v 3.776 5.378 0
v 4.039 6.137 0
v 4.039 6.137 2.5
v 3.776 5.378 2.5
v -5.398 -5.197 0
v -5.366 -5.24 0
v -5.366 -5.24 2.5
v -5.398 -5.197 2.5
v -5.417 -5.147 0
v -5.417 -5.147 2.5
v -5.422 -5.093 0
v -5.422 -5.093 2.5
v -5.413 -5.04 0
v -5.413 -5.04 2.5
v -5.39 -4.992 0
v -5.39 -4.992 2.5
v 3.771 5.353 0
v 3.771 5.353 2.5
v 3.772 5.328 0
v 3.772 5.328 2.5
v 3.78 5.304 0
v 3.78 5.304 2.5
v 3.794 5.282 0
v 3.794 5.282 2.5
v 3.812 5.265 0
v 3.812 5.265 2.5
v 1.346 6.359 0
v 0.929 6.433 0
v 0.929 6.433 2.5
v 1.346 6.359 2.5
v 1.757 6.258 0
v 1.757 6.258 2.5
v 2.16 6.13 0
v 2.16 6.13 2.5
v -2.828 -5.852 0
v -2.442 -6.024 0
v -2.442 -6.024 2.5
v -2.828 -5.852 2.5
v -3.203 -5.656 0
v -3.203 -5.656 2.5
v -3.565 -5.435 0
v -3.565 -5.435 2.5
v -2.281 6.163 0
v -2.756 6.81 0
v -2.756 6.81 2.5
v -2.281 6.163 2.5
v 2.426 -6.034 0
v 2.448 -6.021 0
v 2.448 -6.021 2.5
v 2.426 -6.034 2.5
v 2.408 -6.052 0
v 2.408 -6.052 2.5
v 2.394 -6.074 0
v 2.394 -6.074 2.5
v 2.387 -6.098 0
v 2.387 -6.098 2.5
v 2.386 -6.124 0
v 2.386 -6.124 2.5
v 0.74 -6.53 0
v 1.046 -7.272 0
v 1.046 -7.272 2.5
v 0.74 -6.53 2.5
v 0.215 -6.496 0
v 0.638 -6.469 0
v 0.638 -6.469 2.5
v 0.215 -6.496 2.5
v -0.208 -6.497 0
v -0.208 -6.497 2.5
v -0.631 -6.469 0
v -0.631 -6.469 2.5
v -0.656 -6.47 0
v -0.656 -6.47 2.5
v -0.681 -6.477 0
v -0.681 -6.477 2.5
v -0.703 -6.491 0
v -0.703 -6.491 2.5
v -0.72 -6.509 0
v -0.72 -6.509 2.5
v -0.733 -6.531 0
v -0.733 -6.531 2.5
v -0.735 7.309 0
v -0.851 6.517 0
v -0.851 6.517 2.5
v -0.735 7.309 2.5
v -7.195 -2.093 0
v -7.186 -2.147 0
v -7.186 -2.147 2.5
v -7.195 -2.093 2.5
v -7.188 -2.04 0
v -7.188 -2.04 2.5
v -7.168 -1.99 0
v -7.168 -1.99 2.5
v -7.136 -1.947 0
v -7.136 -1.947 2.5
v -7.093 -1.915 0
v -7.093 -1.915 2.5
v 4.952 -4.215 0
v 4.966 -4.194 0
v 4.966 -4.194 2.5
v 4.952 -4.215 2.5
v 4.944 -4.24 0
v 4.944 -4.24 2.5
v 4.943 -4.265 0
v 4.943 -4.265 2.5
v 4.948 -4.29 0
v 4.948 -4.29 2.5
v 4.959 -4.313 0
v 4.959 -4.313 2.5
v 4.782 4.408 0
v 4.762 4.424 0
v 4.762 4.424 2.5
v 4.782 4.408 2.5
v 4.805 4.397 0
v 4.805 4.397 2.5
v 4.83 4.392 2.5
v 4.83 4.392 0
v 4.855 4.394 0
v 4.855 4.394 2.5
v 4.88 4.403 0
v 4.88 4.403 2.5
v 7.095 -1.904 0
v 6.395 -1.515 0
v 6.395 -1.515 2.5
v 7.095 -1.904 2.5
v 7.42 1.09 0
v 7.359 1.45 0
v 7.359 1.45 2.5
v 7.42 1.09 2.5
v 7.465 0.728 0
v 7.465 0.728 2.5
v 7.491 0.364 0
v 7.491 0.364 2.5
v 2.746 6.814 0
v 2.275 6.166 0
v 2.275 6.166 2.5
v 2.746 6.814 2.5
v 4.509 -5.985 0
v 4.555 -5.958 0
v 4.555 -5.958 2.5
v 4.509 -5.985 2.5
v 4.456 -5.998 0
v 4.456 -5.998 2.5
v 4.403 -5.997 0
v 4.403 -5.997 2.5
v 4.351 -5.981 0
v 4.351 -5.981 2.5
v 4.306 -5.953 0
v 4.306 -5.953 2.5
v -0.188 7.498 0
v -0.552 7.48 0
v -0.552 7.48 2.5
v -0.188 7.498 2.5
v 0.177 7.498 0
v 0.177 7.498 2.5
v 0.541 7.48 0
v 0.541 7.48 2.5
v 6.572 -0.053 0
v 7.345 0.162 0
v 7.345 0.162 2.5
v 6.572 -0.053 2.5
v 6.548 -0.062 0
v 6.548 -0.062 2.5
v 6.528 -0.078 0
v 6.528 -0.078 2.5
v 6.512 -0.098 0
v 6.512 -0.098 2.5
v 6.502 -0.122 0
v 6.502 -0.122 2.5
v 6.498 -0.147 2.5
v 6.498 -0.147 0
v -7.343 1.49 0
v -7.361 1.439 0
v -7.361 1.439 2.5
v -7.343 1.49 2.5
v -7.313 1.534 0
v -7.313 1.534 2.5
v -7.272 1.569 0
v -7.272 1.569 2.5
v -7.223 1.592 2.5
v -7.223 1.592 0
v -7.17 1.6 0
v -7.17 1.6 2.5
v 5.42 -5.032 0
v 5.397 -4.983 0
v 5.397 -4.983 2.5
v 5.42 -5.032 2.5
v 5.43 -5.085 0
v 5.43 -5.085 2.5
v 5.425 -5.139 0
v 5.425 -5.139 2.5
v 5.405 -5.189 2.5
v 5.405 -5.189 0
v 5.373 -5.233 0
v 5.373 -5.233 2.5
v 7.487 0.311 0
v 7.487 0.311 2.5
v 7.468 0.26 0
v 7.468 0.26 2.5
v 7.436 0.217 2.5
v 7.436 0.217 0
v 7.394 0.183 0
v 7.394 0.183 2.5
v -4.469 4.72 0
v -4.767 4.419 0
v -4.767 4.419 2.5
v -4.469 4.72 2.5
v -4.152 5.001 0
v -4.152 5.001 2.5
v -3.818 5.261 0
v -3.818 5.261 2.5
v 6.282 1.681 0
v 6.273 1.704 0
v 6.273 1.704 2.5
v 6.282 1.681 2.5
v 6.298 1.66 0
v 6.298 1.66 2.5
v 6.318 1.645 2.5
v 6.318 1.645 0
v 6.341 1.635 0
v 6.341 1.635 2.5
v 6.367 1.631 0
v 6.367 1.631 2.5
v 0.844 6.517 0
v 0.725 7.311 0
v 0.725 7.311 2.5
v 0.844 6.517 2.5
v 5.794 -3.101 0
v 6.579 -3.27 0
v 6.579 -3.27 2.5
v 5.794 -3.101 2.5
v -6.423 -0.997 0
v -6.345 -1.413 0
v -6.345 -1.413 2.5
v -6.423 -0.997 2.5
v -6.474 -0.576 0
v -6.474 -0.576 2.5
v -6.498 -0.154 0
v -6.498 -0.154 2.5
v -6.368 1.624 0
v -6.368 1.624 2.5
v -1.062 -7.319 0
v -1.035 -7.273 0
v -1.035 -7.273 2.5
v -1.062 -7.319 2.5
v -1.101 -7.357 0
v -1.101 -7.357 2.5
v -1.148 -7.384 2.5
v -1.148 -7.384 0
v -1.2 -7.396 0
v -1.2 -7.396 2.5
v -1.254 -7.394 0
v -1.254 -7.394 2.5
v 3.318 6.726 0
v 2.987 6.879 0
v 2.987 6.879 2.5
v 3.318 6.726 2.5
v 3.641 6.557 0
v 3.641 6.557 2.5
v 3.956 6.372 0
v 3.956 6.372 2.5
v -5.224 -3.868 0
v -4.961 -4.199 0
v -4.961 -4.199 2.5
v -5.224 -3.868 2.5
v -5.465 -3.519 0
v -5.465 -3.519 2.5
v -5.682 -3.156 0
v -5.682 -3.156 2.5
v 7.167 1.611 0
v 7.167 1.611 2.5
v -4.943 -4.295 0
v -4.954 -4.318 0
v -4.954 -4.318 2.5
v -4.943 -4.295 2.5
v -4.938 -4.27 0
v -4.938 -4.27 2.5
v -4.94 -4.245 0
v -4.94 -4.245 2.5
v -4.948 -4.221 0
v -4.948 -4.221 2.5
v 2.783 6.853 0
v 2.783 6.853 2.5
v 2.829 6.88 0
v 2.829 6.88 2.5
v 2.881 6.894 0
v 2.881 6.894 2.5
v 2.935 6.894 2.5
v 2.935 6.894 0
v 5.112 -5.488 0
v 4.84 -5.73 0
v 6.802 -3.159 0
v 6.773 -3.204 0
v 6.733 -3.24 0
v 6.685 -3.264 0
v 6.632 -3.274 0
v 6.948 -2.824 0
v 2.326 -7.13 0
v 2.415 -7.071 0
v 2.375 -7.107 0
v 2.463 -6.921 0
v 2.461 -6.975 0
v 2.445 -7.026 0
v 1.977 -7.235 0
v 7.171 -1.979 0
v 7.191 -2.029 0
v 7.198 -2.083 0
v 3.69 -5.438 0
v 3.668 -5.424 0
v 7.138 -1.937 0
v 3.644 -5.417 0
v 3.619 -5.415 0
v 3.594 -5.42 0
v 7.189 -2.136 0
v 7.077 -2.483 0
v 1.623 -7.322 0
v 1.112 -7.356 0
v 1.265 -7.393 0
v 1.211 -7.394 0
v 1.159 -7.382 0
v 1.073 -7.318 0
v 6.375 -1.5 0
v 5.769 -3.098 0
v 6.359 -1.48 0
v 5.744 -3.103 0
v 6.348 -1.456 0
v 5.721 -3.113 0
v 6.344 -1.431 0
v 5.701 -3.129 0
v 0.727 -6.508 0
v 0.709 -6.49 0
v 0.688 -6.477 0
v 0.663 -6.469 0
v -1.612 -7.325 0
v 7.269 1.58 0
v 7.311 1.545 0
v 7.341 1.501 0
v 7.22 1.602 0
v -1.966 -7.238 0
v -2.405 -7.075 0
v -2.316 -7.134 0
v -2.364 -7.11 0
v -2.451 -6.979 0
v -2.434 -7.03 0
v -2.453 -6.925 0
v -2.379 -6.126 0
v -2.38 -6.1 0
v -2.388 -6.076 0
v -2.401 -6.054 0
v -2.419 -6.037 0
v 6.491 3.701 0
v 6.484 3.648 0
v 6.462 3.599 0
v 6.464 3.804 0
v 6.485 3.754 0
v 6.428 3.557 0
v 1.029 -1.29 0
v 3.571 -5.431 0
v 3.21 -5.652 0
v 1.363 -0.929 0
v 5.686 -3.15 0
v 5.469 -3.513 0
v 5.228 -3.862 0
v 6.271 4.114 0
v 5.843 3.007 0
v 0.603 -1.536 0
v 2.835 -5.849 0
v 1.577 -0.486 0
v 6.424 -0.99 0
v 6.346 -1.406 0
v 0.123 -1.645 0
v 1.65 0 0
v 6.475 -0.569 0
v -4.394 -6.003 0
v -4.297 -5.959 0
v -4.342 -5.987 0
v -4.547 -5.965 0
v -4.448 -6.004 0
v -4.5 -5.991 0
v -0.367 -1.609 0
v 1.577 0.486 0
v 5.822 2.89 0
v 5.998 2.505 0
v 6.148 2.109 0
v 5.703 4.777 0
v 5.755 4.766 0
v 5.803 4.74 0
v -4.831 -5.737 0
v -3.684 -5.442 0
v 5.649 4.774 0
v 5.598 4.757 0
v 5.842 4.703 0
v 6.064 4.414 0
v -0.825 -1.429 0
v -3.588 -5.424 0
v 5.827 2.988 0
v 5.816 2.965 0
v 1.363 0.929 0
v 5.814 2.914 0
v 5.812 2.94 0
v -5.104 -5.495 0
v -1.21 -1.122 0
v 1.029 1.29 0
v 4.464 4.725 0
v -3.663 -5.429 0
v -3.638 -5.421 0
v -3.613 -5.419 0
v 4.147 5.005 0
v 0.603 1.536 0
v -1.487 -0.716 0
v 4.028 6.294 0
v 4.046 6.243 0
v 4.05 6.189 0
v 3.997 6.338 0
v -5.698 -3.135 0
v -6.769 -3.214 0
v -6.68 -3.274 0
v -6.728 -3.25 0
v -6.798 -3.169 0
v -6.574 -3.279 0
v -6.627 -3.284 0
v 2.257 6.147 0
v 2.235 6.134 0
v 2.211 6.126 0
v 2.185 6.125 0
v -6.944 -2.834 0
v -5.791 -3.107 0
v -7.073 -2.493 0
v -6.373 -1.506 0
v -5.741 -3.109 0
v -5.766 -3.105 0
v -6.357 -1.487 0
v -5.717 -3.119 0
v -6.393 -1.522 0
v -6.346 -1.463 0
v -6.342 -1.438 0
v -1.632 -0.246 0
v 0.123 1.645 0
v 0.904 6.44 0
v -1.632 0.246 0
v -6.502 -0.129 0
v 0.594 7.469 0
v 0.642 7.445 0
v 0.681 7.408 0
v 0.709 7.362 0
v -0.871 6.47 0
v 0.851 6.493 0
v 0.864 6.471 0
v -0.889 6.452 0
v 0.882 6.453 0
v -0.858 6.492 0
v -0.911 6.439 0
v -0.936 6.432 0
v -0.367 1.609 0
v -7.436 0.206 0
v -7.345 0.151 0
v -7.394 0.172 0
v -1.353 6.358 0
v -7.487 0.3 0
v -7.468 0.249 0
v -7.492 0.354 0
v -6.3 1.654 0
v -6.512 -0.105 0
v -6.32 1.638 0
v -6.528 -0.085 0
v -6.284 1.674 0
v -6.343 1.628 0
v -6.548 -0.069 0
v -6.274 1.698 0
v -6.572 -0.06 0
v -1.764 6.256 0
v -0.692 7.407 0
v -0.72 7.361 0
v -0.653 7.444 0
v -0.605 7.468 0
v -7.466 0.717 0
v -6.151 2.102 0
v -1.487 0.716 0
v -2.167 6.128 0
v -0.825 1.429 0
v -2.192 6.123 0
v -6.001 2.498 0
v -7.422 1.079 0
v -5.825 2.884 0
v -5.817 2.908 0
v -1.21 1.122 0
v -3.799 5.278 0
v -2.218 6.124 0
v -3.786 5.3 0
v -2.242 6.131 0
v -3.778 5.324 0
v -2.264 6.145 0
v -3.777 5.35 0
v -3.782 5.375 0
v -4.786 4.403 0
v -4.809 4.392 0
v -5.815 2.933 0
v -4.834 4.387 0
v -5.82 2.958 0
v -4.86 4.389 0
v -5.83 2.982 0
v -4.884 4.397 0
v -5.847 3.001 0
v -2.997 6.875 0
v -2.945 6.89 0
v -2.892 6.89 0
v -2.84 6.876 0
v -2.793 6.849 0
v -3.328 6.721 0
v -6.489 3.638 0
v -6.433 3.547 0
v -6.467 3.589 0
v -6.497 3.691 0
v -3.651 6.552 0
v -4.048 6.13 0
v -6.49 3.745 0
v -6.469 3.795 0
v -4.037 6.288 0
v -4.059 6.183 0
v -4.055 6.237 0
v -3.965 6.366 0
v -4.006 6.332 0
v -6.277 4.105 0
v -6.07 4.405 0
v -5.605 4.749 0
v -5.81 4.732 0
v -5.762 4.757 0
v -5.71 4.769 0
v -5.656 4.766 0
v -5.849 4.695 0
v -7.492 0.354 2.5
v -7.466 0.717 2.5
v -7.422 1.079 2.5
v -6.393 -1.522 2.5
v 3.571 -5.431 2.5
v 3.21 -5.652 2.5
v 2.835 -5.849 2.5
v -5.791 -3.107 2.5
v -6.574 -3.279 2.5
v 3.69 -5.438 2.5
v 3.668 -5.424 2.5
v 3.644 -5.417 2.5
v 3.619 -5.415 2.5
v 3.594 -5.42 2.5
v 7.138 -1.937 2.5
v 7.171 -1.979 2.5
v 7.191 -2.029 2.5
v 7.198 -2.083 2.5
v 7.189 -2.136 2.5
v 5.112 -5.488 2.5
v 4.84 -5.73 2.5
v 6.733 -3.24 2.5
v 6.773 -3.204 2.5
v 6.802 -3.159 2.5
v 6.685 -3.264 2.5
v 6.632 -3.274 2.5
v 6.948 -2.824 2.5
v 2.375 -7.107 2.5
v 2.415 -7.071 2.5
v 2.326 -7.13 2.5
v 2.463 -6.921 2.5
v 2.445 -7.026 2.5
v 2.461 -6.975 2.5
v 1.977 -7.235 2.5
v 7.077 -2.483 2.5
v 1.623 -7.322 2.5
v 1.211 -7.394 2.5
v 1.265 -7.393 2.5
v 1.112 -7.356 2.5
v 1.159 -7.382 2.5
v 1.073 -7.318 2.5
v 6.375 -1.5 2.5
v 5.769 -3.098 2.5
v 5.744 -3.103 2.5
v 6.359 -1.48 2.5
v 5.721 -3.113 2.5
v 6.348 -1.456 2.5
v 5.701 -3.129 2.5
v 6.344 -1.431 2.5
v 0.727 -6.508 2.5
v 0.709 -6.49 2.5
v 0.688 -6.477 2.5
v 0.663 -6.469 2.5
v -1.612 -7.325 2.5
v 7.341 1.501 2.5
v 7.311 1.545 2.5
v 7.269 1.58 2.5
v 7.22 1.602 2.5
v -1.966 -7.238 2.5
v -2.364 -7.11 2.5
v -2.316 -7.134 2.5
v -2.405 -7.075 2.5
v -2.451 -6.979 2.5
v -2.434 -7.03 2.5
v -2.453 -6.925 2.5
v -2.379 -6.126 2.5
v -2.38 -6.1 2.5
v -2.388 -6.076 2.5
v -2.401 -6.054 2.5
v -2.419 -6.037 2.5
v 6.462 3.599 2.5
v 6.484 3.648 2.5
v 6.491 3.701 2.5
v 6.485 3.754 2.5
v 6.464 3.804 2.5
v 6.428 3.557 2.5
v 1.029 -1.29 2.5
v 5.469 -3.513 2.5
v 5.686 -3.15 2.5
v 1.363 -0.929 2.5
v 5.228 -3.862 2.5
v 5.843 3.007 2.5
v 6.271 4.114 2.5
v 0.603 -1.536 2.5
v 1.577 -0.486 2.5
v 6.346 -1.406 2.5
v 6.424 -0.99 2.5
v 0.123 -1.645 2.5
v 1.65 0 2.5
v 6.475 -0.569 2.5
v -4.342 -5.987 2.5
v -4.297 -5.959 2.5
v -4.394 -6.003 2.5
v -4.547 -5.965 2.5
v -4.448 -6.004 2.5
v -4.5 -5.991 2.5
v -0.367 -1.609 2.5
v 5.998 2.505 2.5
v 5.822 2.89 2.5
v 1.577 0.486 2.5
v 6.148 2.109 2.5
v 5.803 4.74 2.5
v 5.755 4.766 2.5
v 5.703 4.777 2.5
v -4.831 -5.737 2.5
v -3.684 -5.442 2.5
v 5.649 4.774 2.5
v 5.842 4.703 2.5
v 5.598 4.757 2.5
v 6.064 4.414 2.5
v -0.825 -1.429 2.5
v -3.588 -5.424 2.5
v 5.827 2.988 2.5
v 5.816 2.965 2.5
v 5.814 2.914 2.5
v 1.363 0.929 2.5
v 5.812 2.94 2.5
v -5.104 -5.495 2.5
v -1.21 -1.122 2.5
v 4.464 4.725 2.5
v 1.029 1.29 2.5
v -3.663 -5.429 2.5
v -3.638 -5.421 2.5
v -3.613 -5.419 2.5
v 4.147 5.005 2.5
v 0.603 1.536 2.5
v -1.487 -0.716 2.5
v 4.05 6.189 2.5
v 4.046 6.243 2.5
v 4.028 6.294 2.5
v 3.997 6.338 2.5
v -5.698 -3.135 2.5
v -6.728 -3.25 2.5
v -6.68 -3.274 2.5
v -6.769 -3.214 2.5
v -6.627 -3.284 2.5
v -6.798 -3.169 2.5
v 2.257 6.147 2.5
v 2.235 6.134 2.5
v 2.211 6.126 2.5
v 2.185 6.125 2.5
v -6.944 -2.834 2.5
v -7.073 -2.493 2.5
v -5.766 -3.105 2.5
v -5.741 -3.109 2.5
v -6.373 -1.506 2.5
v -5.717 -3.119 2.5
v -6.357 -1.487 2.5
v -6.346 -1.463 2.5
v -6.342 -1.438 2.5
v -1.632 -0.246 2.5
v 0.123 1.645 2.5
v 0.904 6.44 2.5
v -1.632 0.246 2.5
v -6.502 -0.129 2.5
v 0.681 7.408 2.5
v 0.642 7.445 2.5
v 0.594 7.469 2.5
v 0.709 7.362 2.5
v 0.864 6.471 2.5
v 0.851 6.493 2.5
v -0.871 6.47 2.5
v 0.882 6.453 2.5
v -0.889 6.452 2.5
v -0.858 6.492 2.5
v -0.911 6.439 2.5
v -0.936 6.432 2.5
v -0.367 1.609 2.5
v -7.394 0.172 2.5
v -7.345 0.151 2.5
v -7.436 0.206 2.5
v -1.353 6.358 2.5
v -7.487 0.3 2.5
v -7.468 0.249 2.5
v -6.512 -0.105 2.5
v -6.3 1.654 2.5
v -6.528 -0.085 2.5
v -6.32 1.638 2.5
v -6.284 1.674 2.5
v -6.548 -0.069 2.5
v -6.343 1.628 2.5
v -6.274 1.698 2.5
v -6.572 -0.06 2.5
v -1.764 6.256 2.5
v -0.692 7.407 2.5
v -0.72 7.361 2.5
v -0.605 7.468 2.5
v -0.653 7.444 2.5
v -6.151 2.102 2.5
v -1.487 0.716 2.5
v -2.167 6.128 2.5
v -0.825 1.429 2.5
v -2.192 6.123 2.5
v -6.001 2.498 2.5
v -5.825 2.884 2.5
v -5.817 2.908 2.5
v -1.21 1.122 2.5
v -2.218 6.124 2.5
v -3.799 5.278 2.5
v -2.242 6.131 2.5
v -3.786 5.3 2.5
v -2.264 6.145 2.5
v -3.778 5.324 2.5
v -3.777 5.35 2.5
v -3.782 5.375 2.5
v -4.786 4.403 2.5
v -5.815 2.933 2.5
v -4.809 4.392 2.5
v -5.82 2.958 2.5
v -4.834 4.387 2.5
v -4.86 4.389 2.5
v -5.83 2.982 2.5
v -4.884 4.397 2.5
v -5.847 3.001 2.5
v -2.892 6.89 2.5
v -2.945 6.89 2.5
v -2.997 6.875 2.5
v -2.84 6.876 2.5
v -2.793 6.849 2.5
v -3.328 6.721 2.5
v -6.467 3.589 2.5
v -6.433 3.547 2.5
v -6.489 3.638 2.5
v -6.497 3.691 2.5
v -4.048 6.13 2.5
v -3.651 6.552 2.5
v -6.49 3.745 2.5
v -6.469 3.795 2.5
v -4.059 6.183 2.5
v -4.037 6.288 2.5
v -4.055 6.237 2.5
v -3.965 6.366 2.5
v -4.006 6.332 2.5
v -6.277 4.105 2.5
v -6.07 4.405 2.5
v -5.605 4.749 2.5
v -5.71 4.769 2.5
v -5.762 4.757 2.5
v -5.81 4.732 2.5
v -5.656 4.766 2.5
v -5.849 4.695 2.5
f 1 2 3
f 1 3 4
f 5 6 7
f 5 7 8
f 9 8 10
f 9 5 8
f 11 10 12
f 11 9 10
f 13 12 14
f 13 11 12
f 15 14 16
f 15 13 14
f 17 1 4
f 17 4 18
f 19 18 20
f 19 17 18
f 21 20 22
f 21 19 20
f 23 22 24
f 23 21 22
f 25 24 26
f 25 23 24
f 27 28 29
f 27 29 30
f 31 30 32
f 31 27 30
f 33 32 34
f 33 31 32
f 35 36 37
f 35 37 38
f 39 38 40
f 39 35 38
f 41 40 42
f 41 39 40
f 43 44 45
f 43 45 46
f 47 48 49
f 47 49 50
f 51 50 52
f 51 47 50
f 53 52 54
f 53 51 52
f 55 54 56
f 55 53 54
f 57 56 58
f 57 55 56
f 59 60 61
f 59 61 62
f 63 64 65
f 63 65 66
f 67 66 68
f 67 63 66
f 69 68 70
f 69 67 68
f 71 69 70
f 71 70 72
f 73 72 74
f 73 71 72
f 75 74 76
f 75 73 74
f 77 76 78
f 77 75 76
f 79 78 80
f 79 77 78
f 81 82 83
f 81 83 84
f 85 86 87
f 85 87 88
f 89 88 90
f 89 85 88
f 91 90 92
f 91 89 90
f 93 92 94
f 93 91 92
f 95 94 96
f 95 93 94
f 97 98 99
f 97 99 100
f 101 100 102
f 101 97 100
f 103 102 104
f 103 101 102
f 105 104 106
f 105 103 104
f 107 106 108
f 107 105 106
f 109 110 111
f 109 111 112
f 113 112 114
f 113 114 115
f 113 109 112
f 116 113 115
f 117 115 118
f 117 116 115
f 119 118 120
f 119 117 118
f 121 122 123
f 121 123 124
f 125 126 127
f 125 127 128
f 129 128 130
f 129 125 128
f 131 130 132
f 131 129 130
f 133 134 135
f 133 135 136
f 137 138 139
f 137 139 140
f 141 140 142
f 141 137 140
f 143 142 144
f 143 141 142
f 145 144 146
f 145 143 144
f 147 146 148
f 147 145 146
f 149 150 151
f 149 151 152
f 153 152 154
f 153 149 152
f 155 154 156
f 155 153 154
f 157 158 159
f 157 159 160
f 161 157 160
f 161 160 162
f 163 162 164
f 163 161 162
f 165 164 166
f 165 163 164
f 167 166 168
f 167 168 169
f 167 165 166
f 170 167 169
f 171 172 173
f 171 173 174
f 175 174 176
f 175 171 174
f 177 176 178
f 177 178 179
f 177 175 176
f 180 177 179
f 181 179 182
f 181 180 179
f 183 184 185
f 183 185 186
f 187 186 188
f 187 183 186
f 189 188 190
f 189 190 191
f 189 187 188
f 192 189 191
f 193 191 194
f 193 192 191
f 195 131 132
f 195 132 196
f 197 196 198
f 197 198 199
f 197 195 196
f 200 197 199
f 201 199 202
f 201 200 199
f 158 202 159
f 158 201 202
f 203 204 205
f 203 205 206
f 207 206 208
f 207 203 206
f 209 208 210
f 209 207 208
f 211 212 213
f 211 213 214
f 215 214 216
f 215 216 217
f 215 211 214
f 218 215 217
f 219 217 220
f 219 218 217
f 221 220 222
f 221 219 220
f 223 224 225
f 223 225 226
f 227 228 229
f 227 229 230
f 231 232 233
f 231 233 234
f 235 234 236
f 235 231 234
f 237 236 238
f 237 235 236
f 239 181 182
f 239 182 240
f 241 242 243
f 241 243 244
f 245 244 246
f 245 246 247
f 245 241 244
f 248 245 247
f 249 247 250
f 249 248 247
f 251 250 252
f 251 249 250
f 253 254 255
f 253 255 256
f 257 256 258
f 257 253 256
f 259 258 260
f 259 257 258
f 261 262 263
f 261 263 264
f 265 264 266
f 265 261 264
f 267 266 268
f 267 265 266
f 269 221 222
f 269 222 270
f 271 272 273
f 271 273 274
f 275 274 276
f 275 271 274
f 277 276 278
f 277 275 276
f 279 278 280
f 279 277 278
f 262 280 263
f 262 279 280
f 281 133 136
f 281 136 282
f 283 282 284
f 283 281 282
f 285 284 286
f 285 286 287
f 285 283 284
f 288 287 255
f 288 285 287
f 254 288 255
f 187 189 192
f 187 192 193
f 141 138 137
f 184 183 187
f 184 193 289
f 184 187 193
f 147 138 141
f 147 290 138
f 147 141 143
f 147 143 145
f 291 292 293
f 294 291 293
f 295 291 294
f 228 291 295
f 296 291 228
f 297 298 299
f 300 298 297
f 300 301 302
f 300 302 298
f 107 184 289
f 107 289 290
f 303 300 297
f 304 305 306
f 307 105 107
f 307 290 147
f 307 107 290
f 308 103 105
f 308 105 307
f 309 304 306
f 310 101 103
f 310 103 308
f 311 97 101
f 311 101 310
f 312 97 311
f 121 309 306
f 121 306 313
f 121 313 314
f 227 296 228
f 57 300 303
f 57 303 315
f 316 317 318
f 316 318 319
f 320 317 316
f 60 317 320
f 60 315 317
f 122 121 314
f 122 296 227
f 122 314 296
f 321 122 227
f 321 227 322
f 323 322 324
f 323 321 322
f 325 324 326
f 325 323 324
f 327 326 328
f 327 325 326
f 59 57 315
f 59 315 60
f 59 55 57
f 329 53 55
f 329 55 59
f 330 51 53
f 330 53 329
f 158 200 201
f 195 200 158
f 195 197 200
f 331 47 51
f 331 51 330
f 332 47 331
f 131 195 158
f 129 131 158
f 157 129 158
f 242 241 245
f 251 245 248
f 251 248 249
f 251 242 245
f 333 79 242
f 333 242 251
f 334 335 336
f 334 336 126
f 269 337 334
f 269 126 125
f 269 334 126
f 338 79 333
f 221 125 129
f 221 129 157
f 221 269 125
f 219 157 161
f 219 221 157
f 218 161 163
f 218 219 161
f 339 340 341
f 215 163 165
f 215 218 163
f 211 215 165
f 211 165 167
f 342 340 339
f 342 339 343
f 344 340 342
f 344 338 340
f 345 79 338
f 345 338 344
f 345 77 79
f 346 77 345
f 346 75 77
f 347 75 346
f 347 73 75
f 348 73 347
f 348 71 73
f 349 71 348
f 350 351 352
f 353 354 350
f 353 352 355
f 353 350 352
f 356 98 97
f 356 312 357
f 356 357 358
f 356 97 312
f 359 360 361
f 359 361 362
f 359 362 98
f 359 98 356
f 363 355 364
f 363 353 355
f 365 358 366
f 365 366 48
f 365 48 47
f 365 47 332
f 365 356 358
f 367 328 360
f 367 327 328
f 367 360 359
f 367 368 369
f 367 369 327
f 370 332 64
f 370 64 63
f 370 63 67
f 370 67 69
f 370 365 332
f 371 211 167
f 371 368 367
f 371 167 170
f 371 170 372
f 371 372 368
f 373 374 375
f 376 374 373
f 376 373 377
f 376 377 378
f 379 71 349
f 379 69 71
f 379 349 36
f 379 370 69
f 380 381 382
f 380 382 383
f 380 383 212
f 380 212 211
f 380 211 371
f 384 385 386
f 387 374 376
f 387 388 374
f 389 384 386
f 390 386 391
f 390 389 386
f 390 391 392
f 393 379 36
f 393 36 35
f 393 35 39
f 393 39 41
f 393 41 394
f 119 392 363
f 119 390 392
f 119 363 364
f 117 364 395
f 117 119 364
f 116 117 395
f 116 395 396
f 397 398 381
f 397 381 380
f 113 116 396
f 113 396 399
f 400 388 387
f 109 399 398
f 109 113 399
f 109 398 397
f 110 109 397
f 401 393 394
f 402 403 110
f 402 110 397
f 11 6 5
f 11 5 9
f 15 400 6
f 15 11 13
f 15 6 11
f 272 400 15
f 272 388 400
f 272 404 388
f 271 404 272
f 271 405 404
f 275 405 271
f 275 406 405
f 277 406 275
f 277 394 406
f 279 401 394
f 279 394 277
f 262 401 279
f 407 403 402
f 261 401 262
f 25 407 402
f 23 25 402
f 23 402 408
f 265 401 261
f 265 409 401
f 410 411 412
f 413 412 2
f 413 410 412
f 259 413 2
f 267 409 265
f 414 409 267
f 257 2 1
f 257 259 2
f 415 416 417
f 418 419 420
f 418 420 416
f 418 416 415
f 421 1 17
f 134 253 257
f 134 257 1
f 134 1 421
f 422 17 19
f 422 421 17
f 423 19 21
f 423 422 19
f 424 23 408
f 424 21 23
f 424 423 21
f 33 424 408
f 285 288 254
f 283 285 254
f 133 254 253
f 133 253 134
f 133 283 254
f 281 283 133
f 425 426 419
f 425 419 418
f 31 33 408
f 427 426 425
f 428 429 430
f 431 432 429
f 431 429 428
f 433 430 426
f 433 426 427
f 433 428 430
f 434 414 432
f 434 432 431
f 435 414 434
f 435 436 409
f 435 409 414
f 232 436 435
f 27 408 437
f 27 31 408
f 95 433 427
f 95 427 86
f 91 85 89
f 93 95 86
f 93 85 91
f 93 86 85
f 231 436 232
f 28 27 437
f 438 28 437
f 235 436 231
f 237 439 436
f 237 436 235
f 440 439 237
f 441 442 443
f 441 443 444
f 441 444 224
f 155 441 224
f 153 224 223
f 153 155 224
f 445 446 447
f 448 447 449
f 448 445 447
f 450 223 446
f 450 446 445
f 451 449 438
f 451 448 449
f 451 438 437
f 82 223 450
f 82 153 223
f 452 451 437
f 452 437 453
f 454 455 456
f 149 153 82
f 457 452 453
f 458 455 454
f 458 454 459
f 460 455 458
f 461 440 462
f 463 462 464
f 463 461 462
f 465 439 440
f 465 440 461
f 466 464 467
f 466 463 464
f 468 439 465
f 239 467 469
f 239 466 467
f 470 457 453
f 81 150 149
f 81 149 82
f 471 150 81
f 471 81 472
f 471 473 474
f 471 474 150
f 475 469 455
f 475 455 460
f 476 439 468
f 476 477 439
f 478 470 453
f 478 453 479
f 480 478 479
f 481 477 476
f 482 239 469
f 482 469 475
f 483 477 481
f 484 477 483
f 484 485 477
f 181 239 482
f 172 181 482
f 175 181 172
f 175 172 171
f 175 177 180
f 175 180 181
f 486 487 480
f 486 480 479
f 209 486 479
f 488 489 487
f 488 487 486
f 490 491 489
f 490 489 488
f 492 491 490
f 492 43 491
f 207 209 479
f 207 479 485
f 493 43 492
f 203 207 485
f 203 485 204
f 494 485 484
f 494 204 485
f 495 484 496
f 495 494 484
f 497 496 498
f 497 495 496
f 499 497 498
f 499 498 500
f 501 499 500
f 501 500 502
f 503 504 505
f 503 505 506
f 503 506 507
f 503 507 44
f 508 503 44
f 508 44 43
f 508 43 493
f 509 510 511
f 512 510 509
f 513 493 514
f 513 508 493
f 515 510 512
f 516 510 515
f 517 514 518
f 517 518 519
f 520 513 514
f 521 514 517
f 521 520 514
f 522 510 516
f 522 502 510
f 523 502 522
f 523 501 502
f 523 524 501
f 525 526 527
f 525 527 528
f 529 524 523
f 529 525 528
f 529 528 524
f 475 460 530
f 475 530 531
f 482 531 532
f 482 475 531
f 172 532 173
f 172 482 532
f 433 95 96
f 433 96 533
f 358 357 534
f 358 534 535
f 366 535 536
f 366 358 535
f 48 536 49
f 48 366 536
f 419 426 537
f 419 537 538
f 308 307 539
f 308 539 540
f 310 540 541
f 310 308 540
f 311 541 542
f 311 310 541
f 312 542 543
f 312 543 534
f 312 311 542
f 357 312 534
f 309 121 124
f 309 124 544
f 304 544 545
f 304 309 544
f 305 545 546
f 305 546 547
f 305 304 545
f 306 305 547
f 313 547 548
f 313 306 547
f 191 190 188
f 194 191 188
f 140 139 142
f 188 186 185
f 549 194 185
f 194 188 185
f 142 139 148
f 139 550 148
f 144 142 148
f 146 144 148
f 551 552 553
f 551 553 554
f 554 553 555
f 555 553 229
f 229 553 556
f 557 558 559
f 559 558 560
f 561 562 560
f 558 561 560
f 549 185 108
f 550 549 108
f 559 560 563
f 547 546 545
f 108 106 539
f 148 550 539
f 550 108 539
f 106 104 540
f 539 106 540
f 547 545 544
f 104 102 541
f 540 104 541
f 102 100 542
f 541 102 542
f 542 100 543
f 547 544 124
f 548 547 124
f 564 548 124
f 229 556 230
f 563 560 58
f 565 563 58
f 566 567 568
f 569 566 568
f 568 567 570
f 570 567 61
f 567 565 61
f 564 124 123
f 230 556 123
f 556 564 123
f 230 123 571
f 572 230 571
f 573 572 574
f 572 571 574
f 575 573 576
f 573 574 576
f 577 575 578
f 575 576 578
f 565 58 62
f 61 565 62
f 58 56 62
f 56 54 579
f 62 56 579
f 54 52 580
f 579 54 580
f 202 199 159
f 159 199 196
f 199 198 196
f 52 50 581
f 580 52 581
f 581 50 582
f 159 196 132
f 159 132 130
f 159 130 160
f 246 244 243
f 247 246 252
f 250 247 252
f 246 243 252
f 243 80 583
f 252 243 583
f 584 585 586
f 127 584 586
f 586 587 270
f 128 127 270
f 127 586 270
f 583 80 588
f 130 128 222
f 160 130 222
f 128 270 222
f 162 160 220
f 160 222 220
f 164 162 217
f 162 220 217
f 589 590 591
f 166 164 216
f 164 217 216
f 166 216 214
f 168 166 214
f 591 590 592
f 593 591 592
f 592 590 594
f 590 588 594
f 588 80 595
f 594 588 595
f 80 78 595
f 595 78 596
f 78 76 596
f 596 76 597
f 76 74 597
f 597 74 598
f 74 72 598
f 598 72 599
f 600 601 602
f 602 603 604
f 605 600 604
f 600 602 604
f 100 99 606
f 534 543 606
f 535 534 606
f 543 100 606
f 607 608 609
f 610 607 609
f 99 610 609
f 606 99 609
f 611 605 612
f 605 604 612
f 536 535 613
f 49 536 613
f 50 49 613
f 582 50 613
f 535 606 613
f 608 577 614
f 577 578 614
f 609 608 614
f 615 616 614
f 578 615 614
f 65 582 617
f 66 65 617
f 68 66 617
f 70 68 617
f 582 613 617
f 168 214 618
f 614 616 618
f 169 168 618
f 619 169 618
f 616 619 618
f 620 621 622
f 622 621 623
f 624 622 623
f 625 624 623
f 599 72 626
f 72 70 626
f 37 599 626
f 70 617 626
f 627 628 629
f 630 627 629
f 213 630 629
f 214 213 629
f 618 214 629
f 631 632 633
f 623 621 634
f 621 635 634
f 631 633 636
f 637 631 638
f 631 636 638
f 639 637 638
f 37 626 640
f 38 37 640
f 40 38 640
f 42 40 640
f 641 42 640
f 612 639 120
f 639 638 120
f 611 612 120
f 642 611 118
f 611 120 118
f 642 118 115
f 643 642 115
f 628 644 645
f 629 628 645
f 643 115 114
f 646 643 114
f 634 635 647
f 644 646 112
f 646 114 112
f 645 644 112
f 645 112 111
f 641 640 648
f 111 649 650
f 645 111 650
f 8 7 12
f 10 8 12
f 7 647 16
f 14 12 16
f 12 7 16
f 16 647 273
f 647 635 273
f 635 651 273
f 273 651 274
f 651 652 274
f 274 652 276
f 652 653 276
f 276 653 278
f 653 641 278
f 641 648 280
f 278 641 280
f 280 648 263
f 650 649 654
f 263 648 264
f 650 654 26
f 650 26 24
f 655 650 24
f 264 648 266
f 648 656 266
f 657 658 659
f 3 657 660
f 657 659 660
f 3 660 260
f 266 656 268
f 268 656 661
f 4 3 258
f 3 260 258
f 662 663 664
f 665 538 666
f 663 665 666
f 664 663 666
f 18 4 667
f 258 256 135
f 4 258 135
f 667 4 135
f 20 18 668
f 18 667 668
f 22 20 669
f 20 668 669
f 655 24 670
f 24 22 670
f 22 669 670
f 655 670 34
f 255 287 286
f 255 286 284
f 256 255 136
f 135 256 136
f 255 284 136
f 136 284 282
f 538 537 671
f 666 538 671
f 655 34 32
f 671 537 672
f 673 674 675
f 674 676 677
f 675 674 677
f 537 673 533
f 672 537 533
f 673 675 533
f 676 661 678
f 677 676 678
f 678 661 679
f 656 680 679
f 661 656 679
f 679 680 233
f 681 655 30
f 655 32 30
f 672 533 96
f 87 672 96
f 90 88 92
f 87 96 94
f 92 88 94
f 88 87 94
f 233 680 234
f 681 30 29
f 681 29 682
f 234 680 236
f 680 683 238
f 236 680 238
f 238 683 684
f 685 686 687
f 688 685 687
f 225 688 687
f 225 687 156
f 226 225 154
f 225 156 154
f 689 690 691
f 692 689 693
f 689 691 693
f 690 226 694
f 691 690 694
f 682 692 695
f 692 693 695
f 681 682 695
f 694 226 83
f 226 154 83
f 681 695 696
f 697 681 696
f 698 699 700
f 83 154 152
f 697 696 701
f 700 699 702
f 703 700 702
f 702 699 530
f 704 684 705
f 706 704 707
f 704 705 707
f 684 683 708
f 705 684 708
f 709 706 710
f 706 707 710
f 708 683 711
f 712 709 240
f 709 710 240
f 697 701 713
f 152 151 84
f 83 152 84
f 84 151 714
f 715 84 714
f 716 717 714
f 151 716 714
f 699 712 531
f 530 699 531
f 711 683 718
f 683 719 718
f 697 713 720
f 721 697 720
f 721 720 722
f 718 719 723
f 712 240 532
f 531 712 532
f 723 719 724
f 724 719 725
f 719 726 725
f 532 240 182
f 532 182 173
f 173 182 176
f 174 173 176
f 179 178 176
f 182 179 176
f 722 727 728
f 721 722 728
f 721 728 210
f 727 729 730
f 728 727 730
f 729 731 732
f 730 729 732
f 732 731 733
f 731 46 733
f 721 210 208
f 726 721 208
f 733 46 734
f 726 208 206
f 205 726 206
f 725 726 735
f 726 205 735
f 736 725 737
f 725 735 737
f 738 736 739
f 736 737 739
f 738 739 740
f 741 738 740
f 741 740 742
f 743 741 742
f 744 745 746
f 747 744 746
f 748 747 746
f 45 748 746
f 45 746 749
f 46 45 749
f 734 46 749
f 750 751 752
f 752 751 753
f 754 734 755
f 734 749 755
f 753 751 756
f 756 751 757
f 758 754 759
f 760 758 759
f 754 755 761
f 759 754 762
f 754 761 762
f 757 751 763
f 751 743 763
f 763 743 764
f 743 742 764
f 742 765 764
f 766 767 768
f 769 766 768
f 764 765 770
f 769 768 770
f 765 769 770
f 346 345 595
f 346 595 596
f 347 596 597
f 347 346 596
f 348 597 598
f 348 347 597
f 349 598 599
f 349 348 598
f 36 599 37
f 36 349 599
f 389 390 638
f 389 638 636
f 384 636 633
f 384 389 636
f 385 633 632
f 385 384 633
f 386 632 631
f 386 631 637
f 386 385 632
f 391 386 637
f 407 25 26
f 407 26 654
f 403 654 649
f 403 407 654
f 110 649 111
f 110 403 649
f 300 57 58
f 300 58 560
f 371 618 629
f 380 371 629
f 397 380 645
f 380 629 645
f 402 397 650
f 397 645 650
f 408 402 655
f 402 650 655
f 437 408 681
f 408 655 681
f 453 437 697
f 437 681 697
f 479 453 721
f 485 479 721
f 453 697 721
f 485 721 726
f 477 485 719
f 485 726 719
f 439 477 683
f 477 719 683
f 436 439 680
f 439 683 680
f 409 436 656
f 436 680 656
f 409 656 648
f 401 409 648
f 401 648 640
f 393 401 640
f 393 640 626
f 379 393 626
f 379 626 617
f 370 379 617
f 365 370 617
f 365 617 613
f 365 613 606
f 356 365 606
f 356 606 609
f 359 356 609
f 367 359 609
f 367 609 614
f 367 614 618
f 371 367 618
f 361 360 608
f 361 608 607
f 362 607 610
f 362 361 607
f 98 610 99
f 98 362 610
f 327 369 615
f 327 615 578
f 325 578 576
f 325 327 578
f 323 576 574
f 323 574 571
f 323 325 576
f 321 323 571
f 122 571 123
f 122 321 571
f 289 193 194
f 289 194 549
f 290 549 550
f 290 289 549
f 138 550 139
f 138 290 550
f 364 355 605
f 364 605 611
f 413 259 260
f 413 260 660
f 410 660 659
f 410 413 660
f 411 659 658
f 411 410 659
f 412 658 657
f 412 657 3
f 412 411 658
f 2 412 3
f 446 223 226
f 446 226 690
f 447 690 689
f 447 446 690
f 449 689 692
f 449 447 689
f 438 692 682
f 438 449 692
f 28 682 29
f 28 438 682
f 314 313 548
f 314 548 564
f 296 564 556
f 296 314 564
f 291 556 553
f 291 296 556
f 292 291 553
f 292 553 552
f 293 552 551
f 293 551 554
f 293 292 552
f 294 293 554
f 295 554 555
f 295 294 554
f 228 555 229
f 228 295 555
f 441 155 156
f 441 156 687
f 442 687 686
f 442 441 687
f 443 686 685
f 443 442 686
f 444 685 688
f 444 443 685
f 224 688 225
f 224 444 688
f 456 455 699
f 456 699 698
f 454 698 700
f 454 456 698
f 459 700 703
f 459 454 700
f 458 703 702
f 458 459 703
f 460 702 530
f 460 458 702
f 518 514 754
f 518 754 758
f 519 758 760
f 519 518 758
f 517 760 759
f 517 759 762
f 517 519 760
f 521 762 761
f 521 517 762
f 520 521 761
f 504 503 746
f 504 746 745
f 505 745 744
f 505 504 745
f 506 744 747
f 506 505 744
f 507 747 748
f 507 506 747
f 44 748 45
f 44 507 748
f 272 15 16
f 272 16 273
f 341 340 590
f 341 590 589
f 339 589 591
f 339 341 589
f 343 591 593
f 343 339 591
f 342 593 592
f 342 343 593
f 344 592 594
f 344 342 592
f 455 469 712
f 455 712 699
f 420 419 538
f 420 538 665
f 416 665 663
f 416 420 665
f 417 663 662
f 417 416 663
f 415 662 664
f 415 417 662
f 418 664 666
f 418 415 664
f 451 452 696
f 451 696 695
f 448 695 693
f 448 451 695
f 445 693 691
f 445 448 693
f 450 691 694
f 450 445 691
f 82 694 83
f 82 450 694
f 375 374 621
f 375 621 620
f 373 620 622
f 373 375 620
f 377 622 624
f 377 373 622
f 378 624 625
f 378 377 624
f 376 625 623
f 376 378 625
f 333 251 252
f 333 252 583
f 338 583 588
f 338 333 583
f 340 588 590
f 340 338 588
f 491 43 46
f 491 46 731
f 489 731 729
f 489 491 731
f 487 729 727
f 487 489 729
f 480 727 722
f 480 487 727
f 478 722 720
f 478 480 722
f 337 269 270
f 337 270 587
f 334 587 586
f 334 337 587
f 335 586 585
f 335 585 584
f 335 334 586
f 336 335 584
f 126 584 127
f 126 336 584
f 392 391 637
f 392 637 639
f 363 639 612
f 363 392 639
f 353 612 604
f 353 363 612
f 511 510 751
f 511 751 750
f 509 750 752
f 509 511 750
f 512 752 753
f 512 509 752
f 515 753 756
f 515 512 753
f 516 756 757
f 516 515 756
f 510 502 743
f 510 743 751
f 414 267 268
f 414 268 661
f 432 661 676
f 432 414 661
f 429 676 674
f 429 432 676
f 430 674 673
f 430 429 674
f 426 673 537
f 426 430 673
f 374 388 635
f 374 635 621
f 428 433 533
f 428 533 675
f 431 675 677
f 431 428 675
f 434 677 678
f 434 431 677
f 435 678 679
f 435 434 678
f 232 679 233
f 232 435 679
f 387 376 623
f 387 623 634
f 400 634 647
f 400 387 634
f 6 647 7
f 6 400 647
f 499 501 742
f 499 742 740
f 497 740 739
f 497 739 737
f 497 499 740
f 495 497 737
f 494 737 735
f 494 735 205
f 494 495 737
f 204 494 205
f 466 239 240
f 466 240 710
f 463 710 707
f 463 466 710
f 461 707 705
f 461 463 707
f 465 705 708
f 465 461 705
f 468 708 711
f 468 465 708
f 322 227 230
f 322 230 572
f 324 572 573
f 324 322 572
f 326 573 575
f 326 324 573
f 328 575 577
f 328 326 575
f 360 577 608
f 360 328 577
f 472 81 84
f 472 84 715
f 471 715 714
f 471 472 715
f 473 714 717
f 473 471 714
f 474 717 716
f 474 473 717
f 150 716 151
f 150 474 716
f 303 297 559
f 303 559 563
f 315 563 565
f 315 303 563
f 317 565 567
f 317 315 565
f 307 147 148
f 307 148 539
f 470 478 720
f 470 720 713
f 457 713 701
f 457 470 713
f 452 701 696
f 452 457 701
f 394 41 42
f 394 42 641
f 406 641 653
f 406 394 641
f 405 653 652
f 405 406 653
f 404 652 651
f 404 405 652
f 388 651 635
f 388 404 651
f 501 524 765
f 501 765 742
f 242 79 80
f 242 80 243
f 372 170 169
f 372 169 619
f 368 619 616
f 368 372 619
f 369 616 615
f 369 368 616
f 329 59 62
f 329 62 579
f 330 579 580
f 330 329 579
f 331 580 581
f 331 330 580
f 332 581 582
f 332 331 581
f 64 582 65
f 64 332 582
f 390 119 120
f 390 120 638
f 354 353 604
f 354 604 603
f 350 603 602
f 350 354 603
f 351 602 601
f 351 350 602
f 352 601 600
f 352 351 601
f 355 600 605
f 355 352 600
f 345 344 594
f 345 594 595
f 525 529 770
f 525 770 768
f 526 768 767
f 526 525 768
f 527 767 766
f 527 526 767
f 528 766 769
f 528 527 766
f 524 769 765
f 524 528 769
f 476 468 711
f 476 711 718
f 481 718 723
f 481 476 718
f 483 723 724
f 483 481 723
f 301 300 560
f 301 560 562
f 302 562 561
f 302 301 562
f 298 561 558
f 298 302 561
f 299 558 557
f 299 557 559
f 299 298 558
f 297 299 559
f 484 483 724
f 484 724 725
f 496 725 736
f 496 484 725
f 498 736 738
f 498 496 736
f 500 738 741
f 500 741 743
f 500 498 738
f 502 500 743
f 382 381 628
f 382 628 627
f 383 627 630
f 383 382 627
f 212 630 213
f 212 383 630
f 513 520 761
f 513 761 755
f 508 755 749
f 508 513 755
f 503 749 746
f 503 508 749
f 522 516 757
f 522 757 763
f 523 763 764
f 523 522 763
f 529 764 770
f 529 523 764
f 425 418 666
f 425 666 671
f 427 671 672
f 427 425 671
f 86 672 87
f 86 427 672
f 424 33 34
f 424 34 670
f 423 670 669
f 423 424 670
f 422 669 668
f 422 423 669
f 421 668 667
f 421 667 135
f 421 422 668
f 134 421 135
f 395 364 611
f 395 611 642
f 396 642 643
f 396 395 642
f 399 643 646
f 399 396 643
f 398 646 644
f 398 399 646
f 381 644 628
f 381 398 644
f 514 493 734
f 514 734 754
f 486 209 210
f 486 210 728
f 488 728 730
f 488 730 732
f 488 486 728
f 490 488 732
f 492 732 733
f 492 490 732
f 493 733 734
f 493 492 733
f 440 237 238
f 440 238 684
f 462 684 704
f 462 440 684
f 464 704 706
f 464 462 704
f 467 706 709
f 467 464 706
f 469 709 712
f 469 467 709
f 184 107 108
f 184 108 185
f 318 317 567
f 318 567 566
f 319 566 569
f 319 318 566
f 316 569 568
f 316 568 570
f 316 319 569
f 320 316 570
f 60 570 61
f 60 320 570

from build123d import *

# Parameters (mm, degrees)
RESSALTO_EXTRUS_O1_DEPTH = 2.5
ESBO_O2_R                = 1.65
CORTE_EXTRUS_O1_DEPTH    = 11.891664024


with BuildPart() as part:
    # Esboço1 → Ressalto-extrusão1 (new body)
    with BuildSketch(Plane.XY):
        with BuildLine():
            Line((2.274601503, 6.165929395), (2.745743779, 6.813655149))
            ThreePointArc((2.745743779, 6.813655149), (2.854880588, 6.888968105), (2.987139863, 6.879461857))
            ThreePointArc((2.987139863, 6.879461857), (3.480600792, 6.643449264), (3.955547671, 6.372098761))
            ThreePointArc((3.955547671, 6.372098761), (4.038558016, 6.269040995), (4.03904852, 6.136710424))
            Line((4.03904852, 6.136710424), (3.776369648, 5.378426201))
            ThreePointArc((3.776369648, 5.378426201), (3.775484994, 5.315635516), (3.812211303, 5.264697995))
            ThreePointArc((3.812211303, 5.264697995), (4.307643395, 4.867669707), (4.76197859, 4.424201613))
            ThreePointArc((4.76197859, 4.424201613), (4.817162567, 4.393913756), (4.879509874, 4.402599311))
            Line((4.879509874, 4.402599311), (5.597698808, 4.75718125))
            ThreePointArc((5.597698808, 4.75718125), (5.729334329, 4.773149156), (5.842026327, 4.703267842))
            ThreePointArc((5.842026327, 4.703267842), (6.16928376, 4.264966341), (6.463725469, 3.803978583))
            ThreePointArc((6.463725469, 3.803978583), (6.489334147, 3.674148632), (6.428271384, 3.556747783))
            Line((6.428271384, 3.556747783), (5.843288544, 3.007393407))
            ThreePointArc((5.843288544, 3.007393407), (5.813324936, 2.952206135), (5.822172622, 2.890035634))
            ThreePointArc((5.822172622, 2.890035634), (6.076347708, 2.308245771), (6.272551644, 1.704434182))
            ThreePointArc((6.272551644, 1.704434182), (6.30733916, 1.651970343), (6.366581337, 1.630686782))
            Line((6.366581337, 1.630686782), (7.1672885, 1.610894457))
            ThreePointArc((7.1672885, 1.610894457), (7.291266621, 1.563859258), (7.358574964, 1.449611845))
            ThreePointArc((7.358574964, 1.449611845), (7.444658166, 0.909431028), (7.491141658, 0.364412755))
            ThreePointArc((7.491141658, 0.364412755), (7.45348203, 0.237553096), (7.344854743, 0.161977088))
            Line((7.344854743, 0.161977088), (6.571580455, -0.052596974))
            ThreePointArc((6.571580455, -0.052596974), (6.519402194, -0.087538093), (6.498344357, -0.146699062))
            ThreePointArc((6.498344357, -0.146699062), (6.453033988, -0.779969455), (6.346158708, -1.40579858))
            ThreePointArc((6.346158708, -1.40579858), (6.352580363, -1.468419567), (6.395145742, -1.514796437))
            Line((6.395145742, -1.514796437), (7.094938772, -1.904428843))
            ThreePointArc((7.094938772, -1.904428843), (7.182857599, -2.003691949), (7.189362757, -2.136132756))
            ThreePointArc((7.189362757, -2.136132756), (7.014551104, -2.654443974), (6.802427572, -3.158635644))
            ThreePointArc((6.802427572, -3.158635644), (6.710127004, -3.253462991), (6.578820396, -3.269900606))
            Line((6.578820396, -3.269900606), (5.794402479, -3.100538022))
            ThreePointArc((5.794402479, -3.100538022), (5.731962976, -3.1072284), (5.685823714, -3.149826772))
            ThreePointArc((5.685823714, -3.149826772), (5.351407949, -3.689503078), (4.965937293, -4.193979829))
            ThreePointArc((4.965937293, -4.193979829), (4.942521962, -4.25241225), (4.958659327, -4.313258047))
            Line((4.958659327, -4.313258047), (5.397224074, -4.983470446))
            ThreePointArc((5.397224074, -4.983470446), (5.428942465, -5.112221478), (5.373154184, -5.232515085))
            ThreePointArc((5.373154184, -5.232515085), (4.977494919, -5.610217851), (4.555359307, -5.958078683))
            ThreePointArc((4.555359307, -5.958078683), (4.429562747, -5.999149916), (4.305657579, -5.952683478))
            Line((4.305657579, -5.952683478), (3.689796725, -5.438183174))
            ThreePointArc((3.689796725, -5.438183174), (3.631400117, -5.415090125), (3.57074938, -5.431367127))
            ThreePointArc((3.57074938, -5.431367127), (3.023838841, -5.753816009), (2.448079489, -6.021370842))
            ThreePointArc((2.448079489, -6.021370842), (2.400191343, -6.062228535), (2.386203819, -6.12360422))
            Line((2.386203819, -6.12360422), (2.463070385, -6.920859027))
            ThreePointArc((2.463070385, -6.920859027), (2.431322037, -7.049602675), (2.32602074, -7.130191268))
            ThreePointArc((2.32602074, -7.130191268), (1.800154633, -7.280758429), (1.264713122, -7.392597698))
            ThreePointArc((1.264713122, -7.392597698), (1.134239047, -7.370503893), (1.0461205, -7.271778302))
            Line((1.0461205, -7.271778302), (0.739903009, -6.530006099))
            ThreePointArc((0.739903009, -6.530006099), (0.698927256, -6.482419963), (0.637659395, -6.468646728))
            ThreePointArc((0.637659395, -6.468646728), (0.003544695, -6.499999033), (-0.630603823, -6.46933836))
            ThreePointArc((-0.630603823, -6.46933836), (-0.691994187, -6.483261319), (-0.732902228, -6.531106463))
            Line((-0.732902228, -6.531106463), (-1.035343047, -7.27276221))
            ThreePointArc((-1.035343047, -7.27276221), (-1.123284969, -7.372004856), (-1.253976023, -7.394426559))
            ThreePointArc((-1.253976023, -7.394426559), (-1.789579385, -7.283364993), (-2.315663597, -7.133561671))
            ThreePointArc((-2.315663597, -7.133561671), (-2.42092515, -7.053364252), (-2.453070179, -6.924996352))
            Line((-2.453070179, -6.924996352), (-2.37949357, -6.125883321))
            ThreePointArc((-2.37949357, -6.125883321), (-2.393661418, -6.064705508), (-2.441510673, -6.02403732))
            ThreePointArc((-2.441510673, -6.02403732), (-3.017561497, -5.757110613), (-3.564823398, -5.435258424))
            ThreePointArc((-3.564823398, -5.435258424), (-3.625652188, -5.419057068), (-3.684109206, -5.442410924))
            Line((-3.684109206, -5.442410924), (-4.296571863, -5.958563217))
            ThreePointArc((-4.296571863, -5.958563217), (-4.420560925, -6.005569567), (-4.546701991, -5.964687838))
            ThreePointArc((-4.546701991, -5.964687838), (-4.969342333, -5.617440412), (-5.365549693, -5.240312634))
            ThreePointArc((-5.365549693, -5.240312634), (-5.42148457, -5.120383863), (-5.390292042, -4.991781193))
            Line((-5.390292042, -4.991781193), (-4.953776848, -4.318394499))
            ThreePointArc((-4.953776848, -4.318394499), (-4.937891107, -4.257640109), (-4.961360069, -4.199393559))
            ThreePointArc((-4.961360069, -4.199393559), (-5.347380717, -3.695337532), (-5.682384894, -3.156026285))
            ThreePointArc((-5.682384894, -3.156026285), (-5.728716967, -3.113412148), (-5.791331164, -3.10692463))
            Line((-5.791331164, -3.10692463), (-6.573507845, -3.2793292))
            ThreePointArc((-6.573507845, -3.2793292), (-6.705139647, -3.263330665), (-6.797833327, -3.168511015))
            ThreePointArc((-6.797833327, -3.168511015), (-7.010688839, -2.664627929), (-7.186253016, -2.146571125))
            ThreePointArc((-7.186253016, -2.146571125), (-7.180047212, -2.014385238), (-7.092662959, -1.91500912))
            Line((-7.092662959, -1.91500912), (-6.39320955, -1.52161354))
            ThreePointArc((-6.39320955, -1.52161354), (-6.350909451, -1.475200671), (-6.344621664, -1.412719342))
            ThreePointArc((-6.344621664, -1.412719342), (-6.452179456, -0.787007155), (-6.498180491, -0.153786559))
            ThreePointArc((-6.498180491, -0.153786559), (-6.519401727, -0.094522027), (-6.571828945, -0.059679346))
            Line((-6.571828945, -0.059679346), (-7.344532399, 0.151159617))
            ThreePointArc((-7.344532399, 0.151159617), (-7.453651682, 0.226497964), (-7.491662971, 0.353533496))
            ThreePointArc((-7.491662971, 0.353533496), (-7.44597102, 0.898618699), (-7.360672377, 1.43892396))
            ThreePointArc((-7.360672377, 1.43892396), (-7.293747566, 1.553084768), (-7.170190267, 1.600468464))
            Line((-7.170190267, 1.600468464), (-6.36803499, 1.623750744))
            ThreePointArc((-6.36803499, 1.623750744), (-6.309010977, 1.645189462), (-6.274406897, 1.697591851))
            ThreePointArc((-6.274406897, 1.697591851), (-6.07886164, 2.301617076), (-5.825321249, 2.883683815))
            ThreePointArc((-5.825321249, 2.883683815), (-5.816570119, 2.946021952), (-5.846799914, 3.001237757))
            Line((-5.846799914, 3.001237757), (-6.433013092, 3.547019587))
            ThreePointArc((-6.433013092, 3.547019587), (-6.494621942, 3.66443864), (-6.469242912, 3.794587744))
            ThreePointArc((-6.469242912, 3.794587744), (-6.175470974, 4.256002613), (-5.848850402, 4.694778906))
            ThreePointArc((-5.848850402, 4.694778906), (-5.736538252, 4.764761771), (-5.605113396, 4.749298011))
            Line((-5.605113396, 4.749298011), (-4.884020357, 4.3971333))
            ThreePointArc((-4.884020357, 4.3971333), (-4.82179412, 4.388686517), (-4.766801124, 4.419005209))
            ThreePointArc((-4.766801124, 4.419005209), (-4.31294988, 4.862968572), (-3.817951111, 5.260536979))
            ThreePointArc((-3.817951111, 5.260536979), (-3.781232394, 5.311667805), (-3.782339484, 5.374607458))
            Line((-3.782339484, 5.374607458), (-4.047768011, 6.130300117))
            ThreePointArc((-4.047768011, 6.130300117), (-4.047752584, 6.262900585), (-3.964797265, 6.36634767))
            ThreePointArc((-3.964797265, 6.36634767), (-3.490244951, 6.638387619), (-2.997127286, 6.875116583))
            ThreePointArc((-2.997127286, 6.875116583), (-2.865157157, 6.884889274), (-2.755972594, 6.810120618))
            Line((-2.755972594, 6.810120618), (-2.28113552, 6.163185609))
            ThreePointArc((-2.28113552, 6.163185609), (-2.229962339, 6.126788379), (-2.167178661, 6.128077729))
            ThreePointArc((-2.167178661, 6.128077729), (-1.558993279, 6.310272574), (-0.935934386, 6.432264518))
            ThreePointArc((-0.935934386, 6.432264518), (-0.879659896, 6.460474577), (-0.851390661, 6.516719362))
            Line((-0.851390661, 6.516719362), (-0.73522806, 7.309202767))
            ThreePointArc((-0.73522806, 7.309202767), (-0.67359189, 7.426607482), (-0.552064345, 7.479654067))
            ThreePointArc((-0.552064345, 7.479654067), (-0.005445871, 7.499998023), (0.541201571, 7.480447905))
            ThreePointArc((0.541201571, 7.480447905), (0.662596914, 7.427771616), (0.724528315, 7.310826663))
            Line((0.724528315, 7.310826663), (0.844329975, 6.517326369))
            ThreePointArc((0.844329975, 6.517326369), (0.87272694, 6.46131686), (0.928918317, 6.433281492))
            ThreePointArc((0.928918317, 6.433281492), (1.552109894, 6.311969176), (2.160493629, 6.130437772))
            ThreePointArc((2.160493629, 6.130437772), (2.223432083, 6.12926448), (2.274601503, 6.165929395))
        make_face()
    extrude(amount=RESSALTO_EXTRUS_O1_DEPTH)

    # Esboço2 → Corte-extrusão1 (cut, through all)
    with BuildSketch(Plane.XY.offset(2.5)):
        Circle(ESBO_O2_R)
    extrude(amount=-CORTE_EXTRUS_O1_DEPTH, mode=Mode.SUBTRACT)


solid = part.part
